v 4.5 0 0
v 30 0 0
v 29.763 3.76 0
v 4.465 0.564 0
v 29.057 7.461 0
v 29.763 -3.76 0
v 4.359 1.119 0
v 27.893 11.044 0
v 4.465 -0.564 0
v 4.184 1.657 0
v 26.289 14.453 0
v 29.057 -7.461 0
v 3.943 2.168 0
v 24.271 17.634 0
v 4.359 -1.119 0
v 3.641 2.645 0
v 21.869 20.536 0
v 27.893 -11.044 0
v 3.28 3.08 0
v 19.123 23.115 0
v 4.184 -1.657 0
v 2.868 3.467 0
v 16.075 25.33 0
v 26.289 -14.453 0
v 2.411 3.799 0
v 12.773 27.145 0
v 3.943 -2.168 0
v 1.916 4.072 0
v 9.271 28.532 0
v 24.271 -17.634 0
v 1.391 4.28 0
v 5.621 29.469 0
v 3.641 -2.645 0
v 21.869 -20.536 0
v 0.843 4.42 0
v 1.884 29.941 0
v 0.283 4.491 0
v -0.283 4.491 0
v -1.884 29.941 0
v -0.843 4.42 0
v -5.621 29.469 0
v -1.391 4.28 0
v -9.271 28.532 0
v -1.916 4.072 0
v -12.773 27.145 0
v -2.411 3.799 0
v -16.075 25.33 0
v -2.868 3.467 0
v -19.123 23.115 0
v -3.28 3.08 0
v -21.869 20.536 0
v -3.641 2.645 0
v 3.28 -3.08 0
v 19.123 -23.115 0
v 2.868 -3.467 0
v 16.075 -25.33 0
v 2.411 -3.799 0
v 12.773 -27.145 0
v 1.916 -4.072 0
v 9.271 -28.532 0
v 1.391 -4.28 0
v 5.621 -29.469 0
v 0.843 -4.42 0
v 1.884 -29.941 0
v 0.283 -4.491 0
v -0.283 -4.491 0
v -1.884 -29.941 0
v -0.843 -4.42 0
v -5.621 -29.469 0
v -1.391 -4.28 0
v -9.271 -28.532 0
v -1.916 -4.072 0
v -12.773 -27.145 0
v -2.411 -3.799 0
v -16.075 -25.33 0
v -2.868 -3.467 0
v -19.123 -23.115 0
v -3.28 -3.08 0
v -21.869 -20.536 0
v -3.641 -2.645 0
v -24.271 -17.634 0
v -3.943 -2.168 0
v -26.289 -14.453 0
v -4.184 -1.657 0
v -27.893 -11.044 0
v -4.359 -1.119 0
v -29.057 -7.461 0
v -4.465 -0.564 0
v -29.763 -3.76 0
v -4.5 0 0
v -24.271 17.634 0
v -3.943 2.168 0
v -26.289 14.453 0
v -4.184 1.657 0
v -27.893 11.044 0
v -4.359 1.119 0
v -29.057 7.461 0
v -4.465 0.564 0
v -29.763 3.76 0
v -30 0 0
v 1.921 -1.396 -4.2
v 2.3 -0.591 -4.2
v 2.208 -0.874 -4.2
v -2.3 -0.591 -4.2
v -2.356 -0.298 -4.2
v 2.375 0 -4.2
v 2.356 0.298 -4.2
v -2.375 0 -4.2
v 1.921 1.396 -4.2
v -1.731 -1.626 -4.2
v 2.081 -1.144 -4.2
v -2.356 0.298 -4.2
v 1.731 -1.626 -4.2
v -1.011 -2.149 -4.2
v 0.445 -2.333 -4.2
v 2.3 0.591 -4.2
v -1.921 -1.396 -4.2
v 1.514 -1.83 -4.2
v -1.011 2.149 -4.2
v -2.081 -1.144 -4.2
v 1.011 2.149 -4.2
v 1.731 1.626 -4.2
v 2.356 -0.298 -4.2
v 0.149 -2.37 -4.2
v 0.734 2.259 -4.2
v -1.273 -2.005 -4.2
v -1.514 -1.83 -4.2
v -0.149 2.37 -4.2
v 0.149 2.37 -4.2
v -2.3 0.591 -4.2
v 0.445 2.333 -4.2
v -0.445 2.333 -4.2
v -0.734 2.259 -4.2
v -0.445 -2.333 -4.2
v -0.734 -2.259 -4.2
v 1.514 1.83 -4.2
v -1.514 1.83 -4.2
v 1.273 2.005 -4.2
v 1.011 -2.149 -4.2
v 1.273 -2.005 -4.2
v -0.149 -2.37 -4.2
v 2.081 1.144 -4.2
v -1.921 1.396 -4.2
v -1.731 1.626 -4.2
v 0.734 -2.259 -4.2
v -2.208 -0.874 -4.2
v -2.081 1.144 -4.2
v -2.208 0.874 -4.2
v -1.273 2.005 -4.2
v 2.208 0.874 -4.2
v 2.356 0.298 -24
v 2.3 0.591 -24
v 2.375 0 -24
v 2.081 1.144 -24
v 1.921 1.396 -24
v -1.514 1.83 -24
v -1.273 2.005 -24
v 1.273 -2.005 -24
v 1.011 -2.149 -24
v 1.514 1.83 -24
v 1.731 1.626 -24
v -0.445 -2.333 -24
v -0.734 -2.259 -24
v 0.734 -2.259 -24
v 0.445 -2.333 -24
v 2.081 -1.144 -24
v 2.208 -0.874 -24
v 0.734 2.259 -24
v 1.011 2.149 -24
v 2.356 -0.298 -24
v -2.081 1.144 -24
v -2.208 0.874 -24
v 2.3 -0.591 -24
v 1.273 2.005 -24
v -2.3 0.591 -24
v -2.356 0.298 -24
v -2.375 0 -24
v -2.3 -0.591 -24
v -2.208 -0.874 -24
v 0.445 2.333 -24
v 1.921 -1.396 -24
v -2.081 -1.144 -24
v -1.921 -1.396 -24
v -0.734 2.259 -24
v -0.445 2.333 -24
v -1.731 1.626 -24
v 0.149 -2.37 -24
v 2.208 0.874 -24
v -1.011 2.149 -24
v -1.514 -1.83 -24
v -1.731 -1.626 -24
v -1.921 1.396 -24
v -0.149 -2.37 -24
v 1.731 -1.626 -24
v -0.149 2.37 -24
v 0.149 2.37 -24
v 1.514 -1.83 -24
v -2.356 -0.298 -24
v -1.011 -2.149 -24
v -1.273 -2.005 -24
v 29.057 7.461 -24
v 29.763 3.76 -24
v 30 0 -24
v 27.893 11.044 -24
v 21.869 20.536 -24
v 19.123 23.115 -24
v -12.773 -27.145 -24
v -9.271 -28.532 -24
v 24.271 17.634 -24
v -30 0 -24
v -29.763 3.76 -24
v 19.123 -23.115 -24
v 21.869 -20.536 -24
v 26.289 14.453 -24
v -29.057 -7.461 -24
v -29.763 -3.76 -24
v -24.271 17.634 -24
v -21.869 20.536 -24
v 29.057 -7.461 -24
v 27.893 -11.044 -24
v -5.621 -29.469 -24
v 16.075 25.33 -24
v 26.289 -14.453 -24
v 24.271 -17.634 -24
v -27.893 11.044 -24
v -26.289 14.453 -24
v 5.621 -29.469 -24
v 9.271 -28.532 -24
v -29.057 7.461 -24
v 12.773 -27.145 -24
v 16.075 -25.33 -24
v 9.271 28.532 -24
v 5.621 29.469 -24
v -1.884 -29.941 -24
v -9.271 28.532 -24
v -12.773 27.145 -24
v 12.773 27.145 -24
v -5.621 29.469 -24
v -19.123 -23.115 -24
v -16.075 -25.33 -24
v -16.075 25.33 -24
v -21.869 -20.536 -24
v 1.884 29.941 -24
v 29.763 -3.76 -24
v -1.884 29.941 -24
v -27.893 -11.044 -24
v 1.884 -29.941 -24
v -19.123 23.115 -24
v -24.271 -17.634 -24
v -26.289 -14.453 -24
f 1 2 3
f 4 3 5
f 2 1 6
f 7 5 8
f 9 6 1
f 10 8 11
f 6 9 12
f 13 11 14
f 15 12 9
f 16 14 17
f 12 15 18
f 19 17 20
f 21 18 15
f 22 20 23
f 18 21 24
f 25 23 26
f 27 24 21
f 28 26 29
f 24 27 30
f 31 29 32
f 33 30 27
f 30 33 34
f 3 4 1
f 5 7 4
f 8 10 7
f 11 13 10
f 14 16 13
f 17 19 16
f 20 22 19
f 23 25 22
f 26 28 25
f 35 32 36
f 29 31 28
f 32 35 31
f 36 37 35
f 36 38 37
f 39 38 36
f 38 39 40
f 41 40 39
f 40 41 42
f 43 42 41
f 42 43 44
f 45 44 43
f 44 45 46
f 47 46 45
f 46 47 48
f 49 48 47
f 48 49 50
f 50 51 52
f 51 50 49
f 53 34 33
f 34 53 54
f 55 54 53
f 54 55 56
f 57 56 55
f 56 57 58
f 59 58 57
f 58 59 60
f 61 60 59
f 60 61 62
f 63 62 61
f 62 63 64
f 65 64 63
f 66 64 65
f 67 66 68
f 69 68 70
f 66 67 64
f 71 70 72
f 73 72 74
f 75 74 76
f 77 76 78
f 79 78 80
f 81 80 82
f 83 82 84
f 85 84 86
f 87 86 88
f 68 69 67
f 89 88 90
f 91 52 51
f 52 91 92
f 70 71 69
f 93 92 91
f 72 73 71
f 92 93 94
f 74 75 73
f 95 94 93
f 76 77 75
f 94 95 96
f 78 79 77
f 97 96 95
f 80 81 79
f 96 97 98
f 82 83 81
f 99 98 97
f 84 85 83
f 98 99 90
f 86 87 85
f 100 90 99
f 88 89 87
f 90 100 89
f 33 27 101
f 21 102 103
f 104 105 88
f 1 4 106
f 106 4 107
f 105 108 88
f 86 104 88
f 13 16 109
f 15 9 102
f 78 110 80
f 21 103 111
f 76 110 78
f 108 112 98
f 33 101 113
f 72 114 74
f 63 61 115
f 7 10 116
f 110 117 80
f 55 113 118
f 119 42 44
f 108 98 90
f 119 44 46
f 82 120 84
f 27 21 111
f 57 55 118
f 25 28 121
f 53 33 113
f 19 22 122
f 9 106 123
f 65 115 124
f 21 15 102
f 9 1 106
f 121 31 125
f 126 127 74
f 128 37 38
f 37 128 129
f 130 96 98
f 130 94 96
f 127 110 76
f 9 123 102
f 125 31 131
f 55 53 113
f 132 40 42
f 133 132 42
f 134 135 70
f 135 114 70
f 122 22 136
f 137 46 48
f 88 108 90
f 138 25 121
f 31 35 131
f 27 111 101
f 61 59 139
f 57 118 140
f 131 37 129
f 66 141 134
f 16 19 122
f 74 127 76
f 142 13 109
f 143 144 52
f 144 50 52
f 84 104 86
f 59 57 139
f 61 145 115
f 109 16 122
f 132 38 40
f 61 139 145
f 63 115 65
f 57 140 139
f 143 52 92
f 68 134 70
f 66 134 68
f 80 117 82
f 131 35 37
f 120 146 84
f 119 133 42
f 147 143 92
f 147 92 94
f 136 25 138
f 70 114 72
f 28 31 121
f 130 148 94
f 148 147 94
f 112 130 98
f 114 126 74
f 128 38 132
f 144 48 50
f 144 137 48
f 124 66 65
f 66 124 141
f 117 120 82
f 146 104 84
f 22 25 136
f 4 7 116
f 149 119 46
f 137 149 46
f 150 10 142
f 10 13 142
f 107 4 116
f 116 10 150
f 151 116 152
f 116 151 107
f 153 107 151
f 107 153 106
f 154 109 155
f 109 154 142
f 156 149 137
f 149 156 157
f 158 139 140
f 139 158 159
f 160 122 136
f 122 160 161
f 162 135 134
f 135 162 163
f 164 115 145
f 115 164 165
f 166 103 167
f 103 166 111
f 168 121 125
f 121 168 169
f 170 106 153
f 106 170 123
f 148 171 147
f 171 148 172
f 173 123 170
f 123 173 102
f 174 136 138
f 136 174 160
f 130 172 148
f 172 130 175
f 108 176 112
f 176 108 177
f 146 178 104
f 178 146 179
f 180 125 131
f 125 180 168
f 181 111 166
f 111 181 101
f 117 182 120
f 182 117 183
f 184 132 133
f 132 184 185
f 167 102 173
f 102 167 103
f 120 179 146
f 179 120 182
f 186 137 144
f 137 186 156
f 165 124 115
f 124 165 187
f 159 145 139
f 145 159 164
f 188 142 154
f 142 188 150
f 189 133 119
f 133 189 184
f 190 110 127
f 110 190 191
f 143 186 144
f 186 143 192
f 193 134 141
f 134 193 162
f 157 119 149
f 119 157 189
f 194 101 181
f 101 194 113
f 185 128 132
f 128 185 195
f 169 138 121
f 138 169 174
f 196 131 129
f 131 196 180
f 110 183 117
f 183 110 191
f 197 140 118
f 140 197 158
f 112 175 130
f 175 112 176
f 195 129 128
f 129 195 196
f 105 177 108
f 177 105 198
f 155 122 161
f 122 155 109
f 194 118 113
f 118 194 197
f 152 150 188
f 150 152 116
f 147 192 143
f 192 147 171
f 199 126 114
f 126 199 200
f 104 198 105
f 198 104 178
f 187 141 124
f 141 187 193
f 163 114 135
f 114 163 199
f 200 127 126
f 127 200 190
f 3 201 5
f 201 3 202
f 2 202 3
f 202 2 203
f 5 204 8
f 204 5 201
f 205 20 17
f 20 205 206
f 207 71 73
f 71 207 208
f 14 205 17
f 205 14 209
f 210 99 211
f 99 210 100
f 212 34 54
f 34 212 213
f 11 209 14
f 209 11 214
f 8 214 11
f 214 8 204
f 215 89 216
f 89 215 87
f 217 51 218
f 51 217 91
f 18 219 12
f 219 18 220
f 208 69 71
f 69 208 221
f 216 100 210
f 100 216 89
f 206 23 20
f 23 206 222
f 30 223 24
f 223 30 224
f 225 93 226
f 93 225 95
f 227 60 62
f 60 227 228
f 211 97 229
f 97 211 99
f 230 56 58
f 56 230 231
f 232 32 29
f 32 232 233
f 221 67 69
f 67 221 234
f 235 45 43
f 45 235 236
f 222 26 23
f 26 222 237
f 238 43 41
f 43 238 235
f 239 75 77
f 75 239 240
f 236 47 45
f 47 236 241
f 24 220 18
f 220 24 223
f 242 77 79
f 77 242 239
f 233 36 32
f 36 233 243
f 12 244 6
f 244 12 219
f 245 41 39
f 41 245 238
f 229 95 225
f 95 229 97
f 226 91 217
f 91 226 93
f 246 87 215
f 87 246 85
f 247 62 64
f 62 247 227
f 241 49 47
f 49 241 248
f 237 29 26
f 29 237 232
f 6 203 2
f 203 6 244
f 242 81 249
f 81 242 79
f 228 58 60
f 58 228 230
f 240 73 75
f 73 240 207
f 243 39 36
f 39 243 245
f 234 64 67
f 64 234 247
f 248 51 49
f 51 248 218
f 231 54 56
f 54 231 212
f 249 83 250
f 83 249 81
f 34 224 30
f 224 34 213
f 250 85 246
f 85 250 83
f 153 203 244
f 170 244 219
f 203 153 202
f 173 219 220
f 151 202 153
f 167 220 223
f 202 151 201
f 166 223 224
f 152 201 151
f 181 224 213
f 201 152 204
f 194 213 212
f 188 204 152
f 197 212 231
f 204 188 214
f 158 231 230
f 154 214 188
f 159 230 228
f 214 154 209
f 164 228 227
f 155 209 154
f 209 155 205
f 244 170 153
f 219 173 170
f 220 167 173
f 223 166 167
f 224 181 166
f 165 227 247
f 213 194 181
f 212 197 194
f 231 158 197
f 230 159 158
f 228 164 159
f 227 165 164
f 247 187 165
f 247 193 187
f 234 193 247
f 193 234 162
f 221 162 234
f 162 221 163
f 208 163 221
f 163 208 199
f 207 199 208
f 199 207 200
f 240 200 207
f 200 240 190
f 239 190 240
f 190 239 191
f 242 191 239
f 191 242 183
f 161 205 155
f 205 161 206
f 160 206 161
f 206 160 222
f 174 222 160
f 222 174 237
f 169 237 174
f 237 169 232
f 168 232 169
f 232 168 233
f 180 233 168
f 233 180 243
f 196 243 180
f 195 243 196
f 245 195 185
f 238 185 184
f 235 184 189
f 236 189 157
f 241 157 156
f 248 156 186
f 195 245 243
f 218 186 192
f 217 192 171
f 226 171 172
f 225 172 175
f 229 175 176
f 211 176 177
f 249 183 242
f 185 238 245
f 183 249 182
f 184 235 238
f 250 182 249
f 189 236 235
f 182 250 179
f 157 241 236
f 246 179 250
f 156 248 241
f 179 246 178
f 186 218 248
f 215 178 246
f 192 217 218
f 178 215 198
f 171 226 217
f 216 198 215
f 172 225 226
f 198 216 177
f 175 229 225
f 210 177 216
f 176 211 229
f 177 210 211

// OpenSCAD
$fn = 50;

difference() {
	union() {
		translate(v = [0, 0, -24.0]) {
			cylinder(h = 24, r = 30.0);
		}
	}
	union() {
		translate(v = [0, 0, 0]) {
			rotate(a = [0, 0, 0]) {
				difference() {
					union() {
						translate(v = [0, 0, -27.0]) {
							cylinder(h = 27, r = 2.25);
						}
						translate(v = [0, 0, -4.2]) {
							cylinder(h = 4.2, r1 = 2.375, r2 = 4.5);
						}
						translate(v = [0, 0, -27.0]) {
							cylinder(h = 27, r = 2.375);
						}
						translate(v = [0, 0, -27.0]) {
							cylinder(h = 27, r = 2.25);
						}
					}
					union();
				}
			}
		}
	}
}
